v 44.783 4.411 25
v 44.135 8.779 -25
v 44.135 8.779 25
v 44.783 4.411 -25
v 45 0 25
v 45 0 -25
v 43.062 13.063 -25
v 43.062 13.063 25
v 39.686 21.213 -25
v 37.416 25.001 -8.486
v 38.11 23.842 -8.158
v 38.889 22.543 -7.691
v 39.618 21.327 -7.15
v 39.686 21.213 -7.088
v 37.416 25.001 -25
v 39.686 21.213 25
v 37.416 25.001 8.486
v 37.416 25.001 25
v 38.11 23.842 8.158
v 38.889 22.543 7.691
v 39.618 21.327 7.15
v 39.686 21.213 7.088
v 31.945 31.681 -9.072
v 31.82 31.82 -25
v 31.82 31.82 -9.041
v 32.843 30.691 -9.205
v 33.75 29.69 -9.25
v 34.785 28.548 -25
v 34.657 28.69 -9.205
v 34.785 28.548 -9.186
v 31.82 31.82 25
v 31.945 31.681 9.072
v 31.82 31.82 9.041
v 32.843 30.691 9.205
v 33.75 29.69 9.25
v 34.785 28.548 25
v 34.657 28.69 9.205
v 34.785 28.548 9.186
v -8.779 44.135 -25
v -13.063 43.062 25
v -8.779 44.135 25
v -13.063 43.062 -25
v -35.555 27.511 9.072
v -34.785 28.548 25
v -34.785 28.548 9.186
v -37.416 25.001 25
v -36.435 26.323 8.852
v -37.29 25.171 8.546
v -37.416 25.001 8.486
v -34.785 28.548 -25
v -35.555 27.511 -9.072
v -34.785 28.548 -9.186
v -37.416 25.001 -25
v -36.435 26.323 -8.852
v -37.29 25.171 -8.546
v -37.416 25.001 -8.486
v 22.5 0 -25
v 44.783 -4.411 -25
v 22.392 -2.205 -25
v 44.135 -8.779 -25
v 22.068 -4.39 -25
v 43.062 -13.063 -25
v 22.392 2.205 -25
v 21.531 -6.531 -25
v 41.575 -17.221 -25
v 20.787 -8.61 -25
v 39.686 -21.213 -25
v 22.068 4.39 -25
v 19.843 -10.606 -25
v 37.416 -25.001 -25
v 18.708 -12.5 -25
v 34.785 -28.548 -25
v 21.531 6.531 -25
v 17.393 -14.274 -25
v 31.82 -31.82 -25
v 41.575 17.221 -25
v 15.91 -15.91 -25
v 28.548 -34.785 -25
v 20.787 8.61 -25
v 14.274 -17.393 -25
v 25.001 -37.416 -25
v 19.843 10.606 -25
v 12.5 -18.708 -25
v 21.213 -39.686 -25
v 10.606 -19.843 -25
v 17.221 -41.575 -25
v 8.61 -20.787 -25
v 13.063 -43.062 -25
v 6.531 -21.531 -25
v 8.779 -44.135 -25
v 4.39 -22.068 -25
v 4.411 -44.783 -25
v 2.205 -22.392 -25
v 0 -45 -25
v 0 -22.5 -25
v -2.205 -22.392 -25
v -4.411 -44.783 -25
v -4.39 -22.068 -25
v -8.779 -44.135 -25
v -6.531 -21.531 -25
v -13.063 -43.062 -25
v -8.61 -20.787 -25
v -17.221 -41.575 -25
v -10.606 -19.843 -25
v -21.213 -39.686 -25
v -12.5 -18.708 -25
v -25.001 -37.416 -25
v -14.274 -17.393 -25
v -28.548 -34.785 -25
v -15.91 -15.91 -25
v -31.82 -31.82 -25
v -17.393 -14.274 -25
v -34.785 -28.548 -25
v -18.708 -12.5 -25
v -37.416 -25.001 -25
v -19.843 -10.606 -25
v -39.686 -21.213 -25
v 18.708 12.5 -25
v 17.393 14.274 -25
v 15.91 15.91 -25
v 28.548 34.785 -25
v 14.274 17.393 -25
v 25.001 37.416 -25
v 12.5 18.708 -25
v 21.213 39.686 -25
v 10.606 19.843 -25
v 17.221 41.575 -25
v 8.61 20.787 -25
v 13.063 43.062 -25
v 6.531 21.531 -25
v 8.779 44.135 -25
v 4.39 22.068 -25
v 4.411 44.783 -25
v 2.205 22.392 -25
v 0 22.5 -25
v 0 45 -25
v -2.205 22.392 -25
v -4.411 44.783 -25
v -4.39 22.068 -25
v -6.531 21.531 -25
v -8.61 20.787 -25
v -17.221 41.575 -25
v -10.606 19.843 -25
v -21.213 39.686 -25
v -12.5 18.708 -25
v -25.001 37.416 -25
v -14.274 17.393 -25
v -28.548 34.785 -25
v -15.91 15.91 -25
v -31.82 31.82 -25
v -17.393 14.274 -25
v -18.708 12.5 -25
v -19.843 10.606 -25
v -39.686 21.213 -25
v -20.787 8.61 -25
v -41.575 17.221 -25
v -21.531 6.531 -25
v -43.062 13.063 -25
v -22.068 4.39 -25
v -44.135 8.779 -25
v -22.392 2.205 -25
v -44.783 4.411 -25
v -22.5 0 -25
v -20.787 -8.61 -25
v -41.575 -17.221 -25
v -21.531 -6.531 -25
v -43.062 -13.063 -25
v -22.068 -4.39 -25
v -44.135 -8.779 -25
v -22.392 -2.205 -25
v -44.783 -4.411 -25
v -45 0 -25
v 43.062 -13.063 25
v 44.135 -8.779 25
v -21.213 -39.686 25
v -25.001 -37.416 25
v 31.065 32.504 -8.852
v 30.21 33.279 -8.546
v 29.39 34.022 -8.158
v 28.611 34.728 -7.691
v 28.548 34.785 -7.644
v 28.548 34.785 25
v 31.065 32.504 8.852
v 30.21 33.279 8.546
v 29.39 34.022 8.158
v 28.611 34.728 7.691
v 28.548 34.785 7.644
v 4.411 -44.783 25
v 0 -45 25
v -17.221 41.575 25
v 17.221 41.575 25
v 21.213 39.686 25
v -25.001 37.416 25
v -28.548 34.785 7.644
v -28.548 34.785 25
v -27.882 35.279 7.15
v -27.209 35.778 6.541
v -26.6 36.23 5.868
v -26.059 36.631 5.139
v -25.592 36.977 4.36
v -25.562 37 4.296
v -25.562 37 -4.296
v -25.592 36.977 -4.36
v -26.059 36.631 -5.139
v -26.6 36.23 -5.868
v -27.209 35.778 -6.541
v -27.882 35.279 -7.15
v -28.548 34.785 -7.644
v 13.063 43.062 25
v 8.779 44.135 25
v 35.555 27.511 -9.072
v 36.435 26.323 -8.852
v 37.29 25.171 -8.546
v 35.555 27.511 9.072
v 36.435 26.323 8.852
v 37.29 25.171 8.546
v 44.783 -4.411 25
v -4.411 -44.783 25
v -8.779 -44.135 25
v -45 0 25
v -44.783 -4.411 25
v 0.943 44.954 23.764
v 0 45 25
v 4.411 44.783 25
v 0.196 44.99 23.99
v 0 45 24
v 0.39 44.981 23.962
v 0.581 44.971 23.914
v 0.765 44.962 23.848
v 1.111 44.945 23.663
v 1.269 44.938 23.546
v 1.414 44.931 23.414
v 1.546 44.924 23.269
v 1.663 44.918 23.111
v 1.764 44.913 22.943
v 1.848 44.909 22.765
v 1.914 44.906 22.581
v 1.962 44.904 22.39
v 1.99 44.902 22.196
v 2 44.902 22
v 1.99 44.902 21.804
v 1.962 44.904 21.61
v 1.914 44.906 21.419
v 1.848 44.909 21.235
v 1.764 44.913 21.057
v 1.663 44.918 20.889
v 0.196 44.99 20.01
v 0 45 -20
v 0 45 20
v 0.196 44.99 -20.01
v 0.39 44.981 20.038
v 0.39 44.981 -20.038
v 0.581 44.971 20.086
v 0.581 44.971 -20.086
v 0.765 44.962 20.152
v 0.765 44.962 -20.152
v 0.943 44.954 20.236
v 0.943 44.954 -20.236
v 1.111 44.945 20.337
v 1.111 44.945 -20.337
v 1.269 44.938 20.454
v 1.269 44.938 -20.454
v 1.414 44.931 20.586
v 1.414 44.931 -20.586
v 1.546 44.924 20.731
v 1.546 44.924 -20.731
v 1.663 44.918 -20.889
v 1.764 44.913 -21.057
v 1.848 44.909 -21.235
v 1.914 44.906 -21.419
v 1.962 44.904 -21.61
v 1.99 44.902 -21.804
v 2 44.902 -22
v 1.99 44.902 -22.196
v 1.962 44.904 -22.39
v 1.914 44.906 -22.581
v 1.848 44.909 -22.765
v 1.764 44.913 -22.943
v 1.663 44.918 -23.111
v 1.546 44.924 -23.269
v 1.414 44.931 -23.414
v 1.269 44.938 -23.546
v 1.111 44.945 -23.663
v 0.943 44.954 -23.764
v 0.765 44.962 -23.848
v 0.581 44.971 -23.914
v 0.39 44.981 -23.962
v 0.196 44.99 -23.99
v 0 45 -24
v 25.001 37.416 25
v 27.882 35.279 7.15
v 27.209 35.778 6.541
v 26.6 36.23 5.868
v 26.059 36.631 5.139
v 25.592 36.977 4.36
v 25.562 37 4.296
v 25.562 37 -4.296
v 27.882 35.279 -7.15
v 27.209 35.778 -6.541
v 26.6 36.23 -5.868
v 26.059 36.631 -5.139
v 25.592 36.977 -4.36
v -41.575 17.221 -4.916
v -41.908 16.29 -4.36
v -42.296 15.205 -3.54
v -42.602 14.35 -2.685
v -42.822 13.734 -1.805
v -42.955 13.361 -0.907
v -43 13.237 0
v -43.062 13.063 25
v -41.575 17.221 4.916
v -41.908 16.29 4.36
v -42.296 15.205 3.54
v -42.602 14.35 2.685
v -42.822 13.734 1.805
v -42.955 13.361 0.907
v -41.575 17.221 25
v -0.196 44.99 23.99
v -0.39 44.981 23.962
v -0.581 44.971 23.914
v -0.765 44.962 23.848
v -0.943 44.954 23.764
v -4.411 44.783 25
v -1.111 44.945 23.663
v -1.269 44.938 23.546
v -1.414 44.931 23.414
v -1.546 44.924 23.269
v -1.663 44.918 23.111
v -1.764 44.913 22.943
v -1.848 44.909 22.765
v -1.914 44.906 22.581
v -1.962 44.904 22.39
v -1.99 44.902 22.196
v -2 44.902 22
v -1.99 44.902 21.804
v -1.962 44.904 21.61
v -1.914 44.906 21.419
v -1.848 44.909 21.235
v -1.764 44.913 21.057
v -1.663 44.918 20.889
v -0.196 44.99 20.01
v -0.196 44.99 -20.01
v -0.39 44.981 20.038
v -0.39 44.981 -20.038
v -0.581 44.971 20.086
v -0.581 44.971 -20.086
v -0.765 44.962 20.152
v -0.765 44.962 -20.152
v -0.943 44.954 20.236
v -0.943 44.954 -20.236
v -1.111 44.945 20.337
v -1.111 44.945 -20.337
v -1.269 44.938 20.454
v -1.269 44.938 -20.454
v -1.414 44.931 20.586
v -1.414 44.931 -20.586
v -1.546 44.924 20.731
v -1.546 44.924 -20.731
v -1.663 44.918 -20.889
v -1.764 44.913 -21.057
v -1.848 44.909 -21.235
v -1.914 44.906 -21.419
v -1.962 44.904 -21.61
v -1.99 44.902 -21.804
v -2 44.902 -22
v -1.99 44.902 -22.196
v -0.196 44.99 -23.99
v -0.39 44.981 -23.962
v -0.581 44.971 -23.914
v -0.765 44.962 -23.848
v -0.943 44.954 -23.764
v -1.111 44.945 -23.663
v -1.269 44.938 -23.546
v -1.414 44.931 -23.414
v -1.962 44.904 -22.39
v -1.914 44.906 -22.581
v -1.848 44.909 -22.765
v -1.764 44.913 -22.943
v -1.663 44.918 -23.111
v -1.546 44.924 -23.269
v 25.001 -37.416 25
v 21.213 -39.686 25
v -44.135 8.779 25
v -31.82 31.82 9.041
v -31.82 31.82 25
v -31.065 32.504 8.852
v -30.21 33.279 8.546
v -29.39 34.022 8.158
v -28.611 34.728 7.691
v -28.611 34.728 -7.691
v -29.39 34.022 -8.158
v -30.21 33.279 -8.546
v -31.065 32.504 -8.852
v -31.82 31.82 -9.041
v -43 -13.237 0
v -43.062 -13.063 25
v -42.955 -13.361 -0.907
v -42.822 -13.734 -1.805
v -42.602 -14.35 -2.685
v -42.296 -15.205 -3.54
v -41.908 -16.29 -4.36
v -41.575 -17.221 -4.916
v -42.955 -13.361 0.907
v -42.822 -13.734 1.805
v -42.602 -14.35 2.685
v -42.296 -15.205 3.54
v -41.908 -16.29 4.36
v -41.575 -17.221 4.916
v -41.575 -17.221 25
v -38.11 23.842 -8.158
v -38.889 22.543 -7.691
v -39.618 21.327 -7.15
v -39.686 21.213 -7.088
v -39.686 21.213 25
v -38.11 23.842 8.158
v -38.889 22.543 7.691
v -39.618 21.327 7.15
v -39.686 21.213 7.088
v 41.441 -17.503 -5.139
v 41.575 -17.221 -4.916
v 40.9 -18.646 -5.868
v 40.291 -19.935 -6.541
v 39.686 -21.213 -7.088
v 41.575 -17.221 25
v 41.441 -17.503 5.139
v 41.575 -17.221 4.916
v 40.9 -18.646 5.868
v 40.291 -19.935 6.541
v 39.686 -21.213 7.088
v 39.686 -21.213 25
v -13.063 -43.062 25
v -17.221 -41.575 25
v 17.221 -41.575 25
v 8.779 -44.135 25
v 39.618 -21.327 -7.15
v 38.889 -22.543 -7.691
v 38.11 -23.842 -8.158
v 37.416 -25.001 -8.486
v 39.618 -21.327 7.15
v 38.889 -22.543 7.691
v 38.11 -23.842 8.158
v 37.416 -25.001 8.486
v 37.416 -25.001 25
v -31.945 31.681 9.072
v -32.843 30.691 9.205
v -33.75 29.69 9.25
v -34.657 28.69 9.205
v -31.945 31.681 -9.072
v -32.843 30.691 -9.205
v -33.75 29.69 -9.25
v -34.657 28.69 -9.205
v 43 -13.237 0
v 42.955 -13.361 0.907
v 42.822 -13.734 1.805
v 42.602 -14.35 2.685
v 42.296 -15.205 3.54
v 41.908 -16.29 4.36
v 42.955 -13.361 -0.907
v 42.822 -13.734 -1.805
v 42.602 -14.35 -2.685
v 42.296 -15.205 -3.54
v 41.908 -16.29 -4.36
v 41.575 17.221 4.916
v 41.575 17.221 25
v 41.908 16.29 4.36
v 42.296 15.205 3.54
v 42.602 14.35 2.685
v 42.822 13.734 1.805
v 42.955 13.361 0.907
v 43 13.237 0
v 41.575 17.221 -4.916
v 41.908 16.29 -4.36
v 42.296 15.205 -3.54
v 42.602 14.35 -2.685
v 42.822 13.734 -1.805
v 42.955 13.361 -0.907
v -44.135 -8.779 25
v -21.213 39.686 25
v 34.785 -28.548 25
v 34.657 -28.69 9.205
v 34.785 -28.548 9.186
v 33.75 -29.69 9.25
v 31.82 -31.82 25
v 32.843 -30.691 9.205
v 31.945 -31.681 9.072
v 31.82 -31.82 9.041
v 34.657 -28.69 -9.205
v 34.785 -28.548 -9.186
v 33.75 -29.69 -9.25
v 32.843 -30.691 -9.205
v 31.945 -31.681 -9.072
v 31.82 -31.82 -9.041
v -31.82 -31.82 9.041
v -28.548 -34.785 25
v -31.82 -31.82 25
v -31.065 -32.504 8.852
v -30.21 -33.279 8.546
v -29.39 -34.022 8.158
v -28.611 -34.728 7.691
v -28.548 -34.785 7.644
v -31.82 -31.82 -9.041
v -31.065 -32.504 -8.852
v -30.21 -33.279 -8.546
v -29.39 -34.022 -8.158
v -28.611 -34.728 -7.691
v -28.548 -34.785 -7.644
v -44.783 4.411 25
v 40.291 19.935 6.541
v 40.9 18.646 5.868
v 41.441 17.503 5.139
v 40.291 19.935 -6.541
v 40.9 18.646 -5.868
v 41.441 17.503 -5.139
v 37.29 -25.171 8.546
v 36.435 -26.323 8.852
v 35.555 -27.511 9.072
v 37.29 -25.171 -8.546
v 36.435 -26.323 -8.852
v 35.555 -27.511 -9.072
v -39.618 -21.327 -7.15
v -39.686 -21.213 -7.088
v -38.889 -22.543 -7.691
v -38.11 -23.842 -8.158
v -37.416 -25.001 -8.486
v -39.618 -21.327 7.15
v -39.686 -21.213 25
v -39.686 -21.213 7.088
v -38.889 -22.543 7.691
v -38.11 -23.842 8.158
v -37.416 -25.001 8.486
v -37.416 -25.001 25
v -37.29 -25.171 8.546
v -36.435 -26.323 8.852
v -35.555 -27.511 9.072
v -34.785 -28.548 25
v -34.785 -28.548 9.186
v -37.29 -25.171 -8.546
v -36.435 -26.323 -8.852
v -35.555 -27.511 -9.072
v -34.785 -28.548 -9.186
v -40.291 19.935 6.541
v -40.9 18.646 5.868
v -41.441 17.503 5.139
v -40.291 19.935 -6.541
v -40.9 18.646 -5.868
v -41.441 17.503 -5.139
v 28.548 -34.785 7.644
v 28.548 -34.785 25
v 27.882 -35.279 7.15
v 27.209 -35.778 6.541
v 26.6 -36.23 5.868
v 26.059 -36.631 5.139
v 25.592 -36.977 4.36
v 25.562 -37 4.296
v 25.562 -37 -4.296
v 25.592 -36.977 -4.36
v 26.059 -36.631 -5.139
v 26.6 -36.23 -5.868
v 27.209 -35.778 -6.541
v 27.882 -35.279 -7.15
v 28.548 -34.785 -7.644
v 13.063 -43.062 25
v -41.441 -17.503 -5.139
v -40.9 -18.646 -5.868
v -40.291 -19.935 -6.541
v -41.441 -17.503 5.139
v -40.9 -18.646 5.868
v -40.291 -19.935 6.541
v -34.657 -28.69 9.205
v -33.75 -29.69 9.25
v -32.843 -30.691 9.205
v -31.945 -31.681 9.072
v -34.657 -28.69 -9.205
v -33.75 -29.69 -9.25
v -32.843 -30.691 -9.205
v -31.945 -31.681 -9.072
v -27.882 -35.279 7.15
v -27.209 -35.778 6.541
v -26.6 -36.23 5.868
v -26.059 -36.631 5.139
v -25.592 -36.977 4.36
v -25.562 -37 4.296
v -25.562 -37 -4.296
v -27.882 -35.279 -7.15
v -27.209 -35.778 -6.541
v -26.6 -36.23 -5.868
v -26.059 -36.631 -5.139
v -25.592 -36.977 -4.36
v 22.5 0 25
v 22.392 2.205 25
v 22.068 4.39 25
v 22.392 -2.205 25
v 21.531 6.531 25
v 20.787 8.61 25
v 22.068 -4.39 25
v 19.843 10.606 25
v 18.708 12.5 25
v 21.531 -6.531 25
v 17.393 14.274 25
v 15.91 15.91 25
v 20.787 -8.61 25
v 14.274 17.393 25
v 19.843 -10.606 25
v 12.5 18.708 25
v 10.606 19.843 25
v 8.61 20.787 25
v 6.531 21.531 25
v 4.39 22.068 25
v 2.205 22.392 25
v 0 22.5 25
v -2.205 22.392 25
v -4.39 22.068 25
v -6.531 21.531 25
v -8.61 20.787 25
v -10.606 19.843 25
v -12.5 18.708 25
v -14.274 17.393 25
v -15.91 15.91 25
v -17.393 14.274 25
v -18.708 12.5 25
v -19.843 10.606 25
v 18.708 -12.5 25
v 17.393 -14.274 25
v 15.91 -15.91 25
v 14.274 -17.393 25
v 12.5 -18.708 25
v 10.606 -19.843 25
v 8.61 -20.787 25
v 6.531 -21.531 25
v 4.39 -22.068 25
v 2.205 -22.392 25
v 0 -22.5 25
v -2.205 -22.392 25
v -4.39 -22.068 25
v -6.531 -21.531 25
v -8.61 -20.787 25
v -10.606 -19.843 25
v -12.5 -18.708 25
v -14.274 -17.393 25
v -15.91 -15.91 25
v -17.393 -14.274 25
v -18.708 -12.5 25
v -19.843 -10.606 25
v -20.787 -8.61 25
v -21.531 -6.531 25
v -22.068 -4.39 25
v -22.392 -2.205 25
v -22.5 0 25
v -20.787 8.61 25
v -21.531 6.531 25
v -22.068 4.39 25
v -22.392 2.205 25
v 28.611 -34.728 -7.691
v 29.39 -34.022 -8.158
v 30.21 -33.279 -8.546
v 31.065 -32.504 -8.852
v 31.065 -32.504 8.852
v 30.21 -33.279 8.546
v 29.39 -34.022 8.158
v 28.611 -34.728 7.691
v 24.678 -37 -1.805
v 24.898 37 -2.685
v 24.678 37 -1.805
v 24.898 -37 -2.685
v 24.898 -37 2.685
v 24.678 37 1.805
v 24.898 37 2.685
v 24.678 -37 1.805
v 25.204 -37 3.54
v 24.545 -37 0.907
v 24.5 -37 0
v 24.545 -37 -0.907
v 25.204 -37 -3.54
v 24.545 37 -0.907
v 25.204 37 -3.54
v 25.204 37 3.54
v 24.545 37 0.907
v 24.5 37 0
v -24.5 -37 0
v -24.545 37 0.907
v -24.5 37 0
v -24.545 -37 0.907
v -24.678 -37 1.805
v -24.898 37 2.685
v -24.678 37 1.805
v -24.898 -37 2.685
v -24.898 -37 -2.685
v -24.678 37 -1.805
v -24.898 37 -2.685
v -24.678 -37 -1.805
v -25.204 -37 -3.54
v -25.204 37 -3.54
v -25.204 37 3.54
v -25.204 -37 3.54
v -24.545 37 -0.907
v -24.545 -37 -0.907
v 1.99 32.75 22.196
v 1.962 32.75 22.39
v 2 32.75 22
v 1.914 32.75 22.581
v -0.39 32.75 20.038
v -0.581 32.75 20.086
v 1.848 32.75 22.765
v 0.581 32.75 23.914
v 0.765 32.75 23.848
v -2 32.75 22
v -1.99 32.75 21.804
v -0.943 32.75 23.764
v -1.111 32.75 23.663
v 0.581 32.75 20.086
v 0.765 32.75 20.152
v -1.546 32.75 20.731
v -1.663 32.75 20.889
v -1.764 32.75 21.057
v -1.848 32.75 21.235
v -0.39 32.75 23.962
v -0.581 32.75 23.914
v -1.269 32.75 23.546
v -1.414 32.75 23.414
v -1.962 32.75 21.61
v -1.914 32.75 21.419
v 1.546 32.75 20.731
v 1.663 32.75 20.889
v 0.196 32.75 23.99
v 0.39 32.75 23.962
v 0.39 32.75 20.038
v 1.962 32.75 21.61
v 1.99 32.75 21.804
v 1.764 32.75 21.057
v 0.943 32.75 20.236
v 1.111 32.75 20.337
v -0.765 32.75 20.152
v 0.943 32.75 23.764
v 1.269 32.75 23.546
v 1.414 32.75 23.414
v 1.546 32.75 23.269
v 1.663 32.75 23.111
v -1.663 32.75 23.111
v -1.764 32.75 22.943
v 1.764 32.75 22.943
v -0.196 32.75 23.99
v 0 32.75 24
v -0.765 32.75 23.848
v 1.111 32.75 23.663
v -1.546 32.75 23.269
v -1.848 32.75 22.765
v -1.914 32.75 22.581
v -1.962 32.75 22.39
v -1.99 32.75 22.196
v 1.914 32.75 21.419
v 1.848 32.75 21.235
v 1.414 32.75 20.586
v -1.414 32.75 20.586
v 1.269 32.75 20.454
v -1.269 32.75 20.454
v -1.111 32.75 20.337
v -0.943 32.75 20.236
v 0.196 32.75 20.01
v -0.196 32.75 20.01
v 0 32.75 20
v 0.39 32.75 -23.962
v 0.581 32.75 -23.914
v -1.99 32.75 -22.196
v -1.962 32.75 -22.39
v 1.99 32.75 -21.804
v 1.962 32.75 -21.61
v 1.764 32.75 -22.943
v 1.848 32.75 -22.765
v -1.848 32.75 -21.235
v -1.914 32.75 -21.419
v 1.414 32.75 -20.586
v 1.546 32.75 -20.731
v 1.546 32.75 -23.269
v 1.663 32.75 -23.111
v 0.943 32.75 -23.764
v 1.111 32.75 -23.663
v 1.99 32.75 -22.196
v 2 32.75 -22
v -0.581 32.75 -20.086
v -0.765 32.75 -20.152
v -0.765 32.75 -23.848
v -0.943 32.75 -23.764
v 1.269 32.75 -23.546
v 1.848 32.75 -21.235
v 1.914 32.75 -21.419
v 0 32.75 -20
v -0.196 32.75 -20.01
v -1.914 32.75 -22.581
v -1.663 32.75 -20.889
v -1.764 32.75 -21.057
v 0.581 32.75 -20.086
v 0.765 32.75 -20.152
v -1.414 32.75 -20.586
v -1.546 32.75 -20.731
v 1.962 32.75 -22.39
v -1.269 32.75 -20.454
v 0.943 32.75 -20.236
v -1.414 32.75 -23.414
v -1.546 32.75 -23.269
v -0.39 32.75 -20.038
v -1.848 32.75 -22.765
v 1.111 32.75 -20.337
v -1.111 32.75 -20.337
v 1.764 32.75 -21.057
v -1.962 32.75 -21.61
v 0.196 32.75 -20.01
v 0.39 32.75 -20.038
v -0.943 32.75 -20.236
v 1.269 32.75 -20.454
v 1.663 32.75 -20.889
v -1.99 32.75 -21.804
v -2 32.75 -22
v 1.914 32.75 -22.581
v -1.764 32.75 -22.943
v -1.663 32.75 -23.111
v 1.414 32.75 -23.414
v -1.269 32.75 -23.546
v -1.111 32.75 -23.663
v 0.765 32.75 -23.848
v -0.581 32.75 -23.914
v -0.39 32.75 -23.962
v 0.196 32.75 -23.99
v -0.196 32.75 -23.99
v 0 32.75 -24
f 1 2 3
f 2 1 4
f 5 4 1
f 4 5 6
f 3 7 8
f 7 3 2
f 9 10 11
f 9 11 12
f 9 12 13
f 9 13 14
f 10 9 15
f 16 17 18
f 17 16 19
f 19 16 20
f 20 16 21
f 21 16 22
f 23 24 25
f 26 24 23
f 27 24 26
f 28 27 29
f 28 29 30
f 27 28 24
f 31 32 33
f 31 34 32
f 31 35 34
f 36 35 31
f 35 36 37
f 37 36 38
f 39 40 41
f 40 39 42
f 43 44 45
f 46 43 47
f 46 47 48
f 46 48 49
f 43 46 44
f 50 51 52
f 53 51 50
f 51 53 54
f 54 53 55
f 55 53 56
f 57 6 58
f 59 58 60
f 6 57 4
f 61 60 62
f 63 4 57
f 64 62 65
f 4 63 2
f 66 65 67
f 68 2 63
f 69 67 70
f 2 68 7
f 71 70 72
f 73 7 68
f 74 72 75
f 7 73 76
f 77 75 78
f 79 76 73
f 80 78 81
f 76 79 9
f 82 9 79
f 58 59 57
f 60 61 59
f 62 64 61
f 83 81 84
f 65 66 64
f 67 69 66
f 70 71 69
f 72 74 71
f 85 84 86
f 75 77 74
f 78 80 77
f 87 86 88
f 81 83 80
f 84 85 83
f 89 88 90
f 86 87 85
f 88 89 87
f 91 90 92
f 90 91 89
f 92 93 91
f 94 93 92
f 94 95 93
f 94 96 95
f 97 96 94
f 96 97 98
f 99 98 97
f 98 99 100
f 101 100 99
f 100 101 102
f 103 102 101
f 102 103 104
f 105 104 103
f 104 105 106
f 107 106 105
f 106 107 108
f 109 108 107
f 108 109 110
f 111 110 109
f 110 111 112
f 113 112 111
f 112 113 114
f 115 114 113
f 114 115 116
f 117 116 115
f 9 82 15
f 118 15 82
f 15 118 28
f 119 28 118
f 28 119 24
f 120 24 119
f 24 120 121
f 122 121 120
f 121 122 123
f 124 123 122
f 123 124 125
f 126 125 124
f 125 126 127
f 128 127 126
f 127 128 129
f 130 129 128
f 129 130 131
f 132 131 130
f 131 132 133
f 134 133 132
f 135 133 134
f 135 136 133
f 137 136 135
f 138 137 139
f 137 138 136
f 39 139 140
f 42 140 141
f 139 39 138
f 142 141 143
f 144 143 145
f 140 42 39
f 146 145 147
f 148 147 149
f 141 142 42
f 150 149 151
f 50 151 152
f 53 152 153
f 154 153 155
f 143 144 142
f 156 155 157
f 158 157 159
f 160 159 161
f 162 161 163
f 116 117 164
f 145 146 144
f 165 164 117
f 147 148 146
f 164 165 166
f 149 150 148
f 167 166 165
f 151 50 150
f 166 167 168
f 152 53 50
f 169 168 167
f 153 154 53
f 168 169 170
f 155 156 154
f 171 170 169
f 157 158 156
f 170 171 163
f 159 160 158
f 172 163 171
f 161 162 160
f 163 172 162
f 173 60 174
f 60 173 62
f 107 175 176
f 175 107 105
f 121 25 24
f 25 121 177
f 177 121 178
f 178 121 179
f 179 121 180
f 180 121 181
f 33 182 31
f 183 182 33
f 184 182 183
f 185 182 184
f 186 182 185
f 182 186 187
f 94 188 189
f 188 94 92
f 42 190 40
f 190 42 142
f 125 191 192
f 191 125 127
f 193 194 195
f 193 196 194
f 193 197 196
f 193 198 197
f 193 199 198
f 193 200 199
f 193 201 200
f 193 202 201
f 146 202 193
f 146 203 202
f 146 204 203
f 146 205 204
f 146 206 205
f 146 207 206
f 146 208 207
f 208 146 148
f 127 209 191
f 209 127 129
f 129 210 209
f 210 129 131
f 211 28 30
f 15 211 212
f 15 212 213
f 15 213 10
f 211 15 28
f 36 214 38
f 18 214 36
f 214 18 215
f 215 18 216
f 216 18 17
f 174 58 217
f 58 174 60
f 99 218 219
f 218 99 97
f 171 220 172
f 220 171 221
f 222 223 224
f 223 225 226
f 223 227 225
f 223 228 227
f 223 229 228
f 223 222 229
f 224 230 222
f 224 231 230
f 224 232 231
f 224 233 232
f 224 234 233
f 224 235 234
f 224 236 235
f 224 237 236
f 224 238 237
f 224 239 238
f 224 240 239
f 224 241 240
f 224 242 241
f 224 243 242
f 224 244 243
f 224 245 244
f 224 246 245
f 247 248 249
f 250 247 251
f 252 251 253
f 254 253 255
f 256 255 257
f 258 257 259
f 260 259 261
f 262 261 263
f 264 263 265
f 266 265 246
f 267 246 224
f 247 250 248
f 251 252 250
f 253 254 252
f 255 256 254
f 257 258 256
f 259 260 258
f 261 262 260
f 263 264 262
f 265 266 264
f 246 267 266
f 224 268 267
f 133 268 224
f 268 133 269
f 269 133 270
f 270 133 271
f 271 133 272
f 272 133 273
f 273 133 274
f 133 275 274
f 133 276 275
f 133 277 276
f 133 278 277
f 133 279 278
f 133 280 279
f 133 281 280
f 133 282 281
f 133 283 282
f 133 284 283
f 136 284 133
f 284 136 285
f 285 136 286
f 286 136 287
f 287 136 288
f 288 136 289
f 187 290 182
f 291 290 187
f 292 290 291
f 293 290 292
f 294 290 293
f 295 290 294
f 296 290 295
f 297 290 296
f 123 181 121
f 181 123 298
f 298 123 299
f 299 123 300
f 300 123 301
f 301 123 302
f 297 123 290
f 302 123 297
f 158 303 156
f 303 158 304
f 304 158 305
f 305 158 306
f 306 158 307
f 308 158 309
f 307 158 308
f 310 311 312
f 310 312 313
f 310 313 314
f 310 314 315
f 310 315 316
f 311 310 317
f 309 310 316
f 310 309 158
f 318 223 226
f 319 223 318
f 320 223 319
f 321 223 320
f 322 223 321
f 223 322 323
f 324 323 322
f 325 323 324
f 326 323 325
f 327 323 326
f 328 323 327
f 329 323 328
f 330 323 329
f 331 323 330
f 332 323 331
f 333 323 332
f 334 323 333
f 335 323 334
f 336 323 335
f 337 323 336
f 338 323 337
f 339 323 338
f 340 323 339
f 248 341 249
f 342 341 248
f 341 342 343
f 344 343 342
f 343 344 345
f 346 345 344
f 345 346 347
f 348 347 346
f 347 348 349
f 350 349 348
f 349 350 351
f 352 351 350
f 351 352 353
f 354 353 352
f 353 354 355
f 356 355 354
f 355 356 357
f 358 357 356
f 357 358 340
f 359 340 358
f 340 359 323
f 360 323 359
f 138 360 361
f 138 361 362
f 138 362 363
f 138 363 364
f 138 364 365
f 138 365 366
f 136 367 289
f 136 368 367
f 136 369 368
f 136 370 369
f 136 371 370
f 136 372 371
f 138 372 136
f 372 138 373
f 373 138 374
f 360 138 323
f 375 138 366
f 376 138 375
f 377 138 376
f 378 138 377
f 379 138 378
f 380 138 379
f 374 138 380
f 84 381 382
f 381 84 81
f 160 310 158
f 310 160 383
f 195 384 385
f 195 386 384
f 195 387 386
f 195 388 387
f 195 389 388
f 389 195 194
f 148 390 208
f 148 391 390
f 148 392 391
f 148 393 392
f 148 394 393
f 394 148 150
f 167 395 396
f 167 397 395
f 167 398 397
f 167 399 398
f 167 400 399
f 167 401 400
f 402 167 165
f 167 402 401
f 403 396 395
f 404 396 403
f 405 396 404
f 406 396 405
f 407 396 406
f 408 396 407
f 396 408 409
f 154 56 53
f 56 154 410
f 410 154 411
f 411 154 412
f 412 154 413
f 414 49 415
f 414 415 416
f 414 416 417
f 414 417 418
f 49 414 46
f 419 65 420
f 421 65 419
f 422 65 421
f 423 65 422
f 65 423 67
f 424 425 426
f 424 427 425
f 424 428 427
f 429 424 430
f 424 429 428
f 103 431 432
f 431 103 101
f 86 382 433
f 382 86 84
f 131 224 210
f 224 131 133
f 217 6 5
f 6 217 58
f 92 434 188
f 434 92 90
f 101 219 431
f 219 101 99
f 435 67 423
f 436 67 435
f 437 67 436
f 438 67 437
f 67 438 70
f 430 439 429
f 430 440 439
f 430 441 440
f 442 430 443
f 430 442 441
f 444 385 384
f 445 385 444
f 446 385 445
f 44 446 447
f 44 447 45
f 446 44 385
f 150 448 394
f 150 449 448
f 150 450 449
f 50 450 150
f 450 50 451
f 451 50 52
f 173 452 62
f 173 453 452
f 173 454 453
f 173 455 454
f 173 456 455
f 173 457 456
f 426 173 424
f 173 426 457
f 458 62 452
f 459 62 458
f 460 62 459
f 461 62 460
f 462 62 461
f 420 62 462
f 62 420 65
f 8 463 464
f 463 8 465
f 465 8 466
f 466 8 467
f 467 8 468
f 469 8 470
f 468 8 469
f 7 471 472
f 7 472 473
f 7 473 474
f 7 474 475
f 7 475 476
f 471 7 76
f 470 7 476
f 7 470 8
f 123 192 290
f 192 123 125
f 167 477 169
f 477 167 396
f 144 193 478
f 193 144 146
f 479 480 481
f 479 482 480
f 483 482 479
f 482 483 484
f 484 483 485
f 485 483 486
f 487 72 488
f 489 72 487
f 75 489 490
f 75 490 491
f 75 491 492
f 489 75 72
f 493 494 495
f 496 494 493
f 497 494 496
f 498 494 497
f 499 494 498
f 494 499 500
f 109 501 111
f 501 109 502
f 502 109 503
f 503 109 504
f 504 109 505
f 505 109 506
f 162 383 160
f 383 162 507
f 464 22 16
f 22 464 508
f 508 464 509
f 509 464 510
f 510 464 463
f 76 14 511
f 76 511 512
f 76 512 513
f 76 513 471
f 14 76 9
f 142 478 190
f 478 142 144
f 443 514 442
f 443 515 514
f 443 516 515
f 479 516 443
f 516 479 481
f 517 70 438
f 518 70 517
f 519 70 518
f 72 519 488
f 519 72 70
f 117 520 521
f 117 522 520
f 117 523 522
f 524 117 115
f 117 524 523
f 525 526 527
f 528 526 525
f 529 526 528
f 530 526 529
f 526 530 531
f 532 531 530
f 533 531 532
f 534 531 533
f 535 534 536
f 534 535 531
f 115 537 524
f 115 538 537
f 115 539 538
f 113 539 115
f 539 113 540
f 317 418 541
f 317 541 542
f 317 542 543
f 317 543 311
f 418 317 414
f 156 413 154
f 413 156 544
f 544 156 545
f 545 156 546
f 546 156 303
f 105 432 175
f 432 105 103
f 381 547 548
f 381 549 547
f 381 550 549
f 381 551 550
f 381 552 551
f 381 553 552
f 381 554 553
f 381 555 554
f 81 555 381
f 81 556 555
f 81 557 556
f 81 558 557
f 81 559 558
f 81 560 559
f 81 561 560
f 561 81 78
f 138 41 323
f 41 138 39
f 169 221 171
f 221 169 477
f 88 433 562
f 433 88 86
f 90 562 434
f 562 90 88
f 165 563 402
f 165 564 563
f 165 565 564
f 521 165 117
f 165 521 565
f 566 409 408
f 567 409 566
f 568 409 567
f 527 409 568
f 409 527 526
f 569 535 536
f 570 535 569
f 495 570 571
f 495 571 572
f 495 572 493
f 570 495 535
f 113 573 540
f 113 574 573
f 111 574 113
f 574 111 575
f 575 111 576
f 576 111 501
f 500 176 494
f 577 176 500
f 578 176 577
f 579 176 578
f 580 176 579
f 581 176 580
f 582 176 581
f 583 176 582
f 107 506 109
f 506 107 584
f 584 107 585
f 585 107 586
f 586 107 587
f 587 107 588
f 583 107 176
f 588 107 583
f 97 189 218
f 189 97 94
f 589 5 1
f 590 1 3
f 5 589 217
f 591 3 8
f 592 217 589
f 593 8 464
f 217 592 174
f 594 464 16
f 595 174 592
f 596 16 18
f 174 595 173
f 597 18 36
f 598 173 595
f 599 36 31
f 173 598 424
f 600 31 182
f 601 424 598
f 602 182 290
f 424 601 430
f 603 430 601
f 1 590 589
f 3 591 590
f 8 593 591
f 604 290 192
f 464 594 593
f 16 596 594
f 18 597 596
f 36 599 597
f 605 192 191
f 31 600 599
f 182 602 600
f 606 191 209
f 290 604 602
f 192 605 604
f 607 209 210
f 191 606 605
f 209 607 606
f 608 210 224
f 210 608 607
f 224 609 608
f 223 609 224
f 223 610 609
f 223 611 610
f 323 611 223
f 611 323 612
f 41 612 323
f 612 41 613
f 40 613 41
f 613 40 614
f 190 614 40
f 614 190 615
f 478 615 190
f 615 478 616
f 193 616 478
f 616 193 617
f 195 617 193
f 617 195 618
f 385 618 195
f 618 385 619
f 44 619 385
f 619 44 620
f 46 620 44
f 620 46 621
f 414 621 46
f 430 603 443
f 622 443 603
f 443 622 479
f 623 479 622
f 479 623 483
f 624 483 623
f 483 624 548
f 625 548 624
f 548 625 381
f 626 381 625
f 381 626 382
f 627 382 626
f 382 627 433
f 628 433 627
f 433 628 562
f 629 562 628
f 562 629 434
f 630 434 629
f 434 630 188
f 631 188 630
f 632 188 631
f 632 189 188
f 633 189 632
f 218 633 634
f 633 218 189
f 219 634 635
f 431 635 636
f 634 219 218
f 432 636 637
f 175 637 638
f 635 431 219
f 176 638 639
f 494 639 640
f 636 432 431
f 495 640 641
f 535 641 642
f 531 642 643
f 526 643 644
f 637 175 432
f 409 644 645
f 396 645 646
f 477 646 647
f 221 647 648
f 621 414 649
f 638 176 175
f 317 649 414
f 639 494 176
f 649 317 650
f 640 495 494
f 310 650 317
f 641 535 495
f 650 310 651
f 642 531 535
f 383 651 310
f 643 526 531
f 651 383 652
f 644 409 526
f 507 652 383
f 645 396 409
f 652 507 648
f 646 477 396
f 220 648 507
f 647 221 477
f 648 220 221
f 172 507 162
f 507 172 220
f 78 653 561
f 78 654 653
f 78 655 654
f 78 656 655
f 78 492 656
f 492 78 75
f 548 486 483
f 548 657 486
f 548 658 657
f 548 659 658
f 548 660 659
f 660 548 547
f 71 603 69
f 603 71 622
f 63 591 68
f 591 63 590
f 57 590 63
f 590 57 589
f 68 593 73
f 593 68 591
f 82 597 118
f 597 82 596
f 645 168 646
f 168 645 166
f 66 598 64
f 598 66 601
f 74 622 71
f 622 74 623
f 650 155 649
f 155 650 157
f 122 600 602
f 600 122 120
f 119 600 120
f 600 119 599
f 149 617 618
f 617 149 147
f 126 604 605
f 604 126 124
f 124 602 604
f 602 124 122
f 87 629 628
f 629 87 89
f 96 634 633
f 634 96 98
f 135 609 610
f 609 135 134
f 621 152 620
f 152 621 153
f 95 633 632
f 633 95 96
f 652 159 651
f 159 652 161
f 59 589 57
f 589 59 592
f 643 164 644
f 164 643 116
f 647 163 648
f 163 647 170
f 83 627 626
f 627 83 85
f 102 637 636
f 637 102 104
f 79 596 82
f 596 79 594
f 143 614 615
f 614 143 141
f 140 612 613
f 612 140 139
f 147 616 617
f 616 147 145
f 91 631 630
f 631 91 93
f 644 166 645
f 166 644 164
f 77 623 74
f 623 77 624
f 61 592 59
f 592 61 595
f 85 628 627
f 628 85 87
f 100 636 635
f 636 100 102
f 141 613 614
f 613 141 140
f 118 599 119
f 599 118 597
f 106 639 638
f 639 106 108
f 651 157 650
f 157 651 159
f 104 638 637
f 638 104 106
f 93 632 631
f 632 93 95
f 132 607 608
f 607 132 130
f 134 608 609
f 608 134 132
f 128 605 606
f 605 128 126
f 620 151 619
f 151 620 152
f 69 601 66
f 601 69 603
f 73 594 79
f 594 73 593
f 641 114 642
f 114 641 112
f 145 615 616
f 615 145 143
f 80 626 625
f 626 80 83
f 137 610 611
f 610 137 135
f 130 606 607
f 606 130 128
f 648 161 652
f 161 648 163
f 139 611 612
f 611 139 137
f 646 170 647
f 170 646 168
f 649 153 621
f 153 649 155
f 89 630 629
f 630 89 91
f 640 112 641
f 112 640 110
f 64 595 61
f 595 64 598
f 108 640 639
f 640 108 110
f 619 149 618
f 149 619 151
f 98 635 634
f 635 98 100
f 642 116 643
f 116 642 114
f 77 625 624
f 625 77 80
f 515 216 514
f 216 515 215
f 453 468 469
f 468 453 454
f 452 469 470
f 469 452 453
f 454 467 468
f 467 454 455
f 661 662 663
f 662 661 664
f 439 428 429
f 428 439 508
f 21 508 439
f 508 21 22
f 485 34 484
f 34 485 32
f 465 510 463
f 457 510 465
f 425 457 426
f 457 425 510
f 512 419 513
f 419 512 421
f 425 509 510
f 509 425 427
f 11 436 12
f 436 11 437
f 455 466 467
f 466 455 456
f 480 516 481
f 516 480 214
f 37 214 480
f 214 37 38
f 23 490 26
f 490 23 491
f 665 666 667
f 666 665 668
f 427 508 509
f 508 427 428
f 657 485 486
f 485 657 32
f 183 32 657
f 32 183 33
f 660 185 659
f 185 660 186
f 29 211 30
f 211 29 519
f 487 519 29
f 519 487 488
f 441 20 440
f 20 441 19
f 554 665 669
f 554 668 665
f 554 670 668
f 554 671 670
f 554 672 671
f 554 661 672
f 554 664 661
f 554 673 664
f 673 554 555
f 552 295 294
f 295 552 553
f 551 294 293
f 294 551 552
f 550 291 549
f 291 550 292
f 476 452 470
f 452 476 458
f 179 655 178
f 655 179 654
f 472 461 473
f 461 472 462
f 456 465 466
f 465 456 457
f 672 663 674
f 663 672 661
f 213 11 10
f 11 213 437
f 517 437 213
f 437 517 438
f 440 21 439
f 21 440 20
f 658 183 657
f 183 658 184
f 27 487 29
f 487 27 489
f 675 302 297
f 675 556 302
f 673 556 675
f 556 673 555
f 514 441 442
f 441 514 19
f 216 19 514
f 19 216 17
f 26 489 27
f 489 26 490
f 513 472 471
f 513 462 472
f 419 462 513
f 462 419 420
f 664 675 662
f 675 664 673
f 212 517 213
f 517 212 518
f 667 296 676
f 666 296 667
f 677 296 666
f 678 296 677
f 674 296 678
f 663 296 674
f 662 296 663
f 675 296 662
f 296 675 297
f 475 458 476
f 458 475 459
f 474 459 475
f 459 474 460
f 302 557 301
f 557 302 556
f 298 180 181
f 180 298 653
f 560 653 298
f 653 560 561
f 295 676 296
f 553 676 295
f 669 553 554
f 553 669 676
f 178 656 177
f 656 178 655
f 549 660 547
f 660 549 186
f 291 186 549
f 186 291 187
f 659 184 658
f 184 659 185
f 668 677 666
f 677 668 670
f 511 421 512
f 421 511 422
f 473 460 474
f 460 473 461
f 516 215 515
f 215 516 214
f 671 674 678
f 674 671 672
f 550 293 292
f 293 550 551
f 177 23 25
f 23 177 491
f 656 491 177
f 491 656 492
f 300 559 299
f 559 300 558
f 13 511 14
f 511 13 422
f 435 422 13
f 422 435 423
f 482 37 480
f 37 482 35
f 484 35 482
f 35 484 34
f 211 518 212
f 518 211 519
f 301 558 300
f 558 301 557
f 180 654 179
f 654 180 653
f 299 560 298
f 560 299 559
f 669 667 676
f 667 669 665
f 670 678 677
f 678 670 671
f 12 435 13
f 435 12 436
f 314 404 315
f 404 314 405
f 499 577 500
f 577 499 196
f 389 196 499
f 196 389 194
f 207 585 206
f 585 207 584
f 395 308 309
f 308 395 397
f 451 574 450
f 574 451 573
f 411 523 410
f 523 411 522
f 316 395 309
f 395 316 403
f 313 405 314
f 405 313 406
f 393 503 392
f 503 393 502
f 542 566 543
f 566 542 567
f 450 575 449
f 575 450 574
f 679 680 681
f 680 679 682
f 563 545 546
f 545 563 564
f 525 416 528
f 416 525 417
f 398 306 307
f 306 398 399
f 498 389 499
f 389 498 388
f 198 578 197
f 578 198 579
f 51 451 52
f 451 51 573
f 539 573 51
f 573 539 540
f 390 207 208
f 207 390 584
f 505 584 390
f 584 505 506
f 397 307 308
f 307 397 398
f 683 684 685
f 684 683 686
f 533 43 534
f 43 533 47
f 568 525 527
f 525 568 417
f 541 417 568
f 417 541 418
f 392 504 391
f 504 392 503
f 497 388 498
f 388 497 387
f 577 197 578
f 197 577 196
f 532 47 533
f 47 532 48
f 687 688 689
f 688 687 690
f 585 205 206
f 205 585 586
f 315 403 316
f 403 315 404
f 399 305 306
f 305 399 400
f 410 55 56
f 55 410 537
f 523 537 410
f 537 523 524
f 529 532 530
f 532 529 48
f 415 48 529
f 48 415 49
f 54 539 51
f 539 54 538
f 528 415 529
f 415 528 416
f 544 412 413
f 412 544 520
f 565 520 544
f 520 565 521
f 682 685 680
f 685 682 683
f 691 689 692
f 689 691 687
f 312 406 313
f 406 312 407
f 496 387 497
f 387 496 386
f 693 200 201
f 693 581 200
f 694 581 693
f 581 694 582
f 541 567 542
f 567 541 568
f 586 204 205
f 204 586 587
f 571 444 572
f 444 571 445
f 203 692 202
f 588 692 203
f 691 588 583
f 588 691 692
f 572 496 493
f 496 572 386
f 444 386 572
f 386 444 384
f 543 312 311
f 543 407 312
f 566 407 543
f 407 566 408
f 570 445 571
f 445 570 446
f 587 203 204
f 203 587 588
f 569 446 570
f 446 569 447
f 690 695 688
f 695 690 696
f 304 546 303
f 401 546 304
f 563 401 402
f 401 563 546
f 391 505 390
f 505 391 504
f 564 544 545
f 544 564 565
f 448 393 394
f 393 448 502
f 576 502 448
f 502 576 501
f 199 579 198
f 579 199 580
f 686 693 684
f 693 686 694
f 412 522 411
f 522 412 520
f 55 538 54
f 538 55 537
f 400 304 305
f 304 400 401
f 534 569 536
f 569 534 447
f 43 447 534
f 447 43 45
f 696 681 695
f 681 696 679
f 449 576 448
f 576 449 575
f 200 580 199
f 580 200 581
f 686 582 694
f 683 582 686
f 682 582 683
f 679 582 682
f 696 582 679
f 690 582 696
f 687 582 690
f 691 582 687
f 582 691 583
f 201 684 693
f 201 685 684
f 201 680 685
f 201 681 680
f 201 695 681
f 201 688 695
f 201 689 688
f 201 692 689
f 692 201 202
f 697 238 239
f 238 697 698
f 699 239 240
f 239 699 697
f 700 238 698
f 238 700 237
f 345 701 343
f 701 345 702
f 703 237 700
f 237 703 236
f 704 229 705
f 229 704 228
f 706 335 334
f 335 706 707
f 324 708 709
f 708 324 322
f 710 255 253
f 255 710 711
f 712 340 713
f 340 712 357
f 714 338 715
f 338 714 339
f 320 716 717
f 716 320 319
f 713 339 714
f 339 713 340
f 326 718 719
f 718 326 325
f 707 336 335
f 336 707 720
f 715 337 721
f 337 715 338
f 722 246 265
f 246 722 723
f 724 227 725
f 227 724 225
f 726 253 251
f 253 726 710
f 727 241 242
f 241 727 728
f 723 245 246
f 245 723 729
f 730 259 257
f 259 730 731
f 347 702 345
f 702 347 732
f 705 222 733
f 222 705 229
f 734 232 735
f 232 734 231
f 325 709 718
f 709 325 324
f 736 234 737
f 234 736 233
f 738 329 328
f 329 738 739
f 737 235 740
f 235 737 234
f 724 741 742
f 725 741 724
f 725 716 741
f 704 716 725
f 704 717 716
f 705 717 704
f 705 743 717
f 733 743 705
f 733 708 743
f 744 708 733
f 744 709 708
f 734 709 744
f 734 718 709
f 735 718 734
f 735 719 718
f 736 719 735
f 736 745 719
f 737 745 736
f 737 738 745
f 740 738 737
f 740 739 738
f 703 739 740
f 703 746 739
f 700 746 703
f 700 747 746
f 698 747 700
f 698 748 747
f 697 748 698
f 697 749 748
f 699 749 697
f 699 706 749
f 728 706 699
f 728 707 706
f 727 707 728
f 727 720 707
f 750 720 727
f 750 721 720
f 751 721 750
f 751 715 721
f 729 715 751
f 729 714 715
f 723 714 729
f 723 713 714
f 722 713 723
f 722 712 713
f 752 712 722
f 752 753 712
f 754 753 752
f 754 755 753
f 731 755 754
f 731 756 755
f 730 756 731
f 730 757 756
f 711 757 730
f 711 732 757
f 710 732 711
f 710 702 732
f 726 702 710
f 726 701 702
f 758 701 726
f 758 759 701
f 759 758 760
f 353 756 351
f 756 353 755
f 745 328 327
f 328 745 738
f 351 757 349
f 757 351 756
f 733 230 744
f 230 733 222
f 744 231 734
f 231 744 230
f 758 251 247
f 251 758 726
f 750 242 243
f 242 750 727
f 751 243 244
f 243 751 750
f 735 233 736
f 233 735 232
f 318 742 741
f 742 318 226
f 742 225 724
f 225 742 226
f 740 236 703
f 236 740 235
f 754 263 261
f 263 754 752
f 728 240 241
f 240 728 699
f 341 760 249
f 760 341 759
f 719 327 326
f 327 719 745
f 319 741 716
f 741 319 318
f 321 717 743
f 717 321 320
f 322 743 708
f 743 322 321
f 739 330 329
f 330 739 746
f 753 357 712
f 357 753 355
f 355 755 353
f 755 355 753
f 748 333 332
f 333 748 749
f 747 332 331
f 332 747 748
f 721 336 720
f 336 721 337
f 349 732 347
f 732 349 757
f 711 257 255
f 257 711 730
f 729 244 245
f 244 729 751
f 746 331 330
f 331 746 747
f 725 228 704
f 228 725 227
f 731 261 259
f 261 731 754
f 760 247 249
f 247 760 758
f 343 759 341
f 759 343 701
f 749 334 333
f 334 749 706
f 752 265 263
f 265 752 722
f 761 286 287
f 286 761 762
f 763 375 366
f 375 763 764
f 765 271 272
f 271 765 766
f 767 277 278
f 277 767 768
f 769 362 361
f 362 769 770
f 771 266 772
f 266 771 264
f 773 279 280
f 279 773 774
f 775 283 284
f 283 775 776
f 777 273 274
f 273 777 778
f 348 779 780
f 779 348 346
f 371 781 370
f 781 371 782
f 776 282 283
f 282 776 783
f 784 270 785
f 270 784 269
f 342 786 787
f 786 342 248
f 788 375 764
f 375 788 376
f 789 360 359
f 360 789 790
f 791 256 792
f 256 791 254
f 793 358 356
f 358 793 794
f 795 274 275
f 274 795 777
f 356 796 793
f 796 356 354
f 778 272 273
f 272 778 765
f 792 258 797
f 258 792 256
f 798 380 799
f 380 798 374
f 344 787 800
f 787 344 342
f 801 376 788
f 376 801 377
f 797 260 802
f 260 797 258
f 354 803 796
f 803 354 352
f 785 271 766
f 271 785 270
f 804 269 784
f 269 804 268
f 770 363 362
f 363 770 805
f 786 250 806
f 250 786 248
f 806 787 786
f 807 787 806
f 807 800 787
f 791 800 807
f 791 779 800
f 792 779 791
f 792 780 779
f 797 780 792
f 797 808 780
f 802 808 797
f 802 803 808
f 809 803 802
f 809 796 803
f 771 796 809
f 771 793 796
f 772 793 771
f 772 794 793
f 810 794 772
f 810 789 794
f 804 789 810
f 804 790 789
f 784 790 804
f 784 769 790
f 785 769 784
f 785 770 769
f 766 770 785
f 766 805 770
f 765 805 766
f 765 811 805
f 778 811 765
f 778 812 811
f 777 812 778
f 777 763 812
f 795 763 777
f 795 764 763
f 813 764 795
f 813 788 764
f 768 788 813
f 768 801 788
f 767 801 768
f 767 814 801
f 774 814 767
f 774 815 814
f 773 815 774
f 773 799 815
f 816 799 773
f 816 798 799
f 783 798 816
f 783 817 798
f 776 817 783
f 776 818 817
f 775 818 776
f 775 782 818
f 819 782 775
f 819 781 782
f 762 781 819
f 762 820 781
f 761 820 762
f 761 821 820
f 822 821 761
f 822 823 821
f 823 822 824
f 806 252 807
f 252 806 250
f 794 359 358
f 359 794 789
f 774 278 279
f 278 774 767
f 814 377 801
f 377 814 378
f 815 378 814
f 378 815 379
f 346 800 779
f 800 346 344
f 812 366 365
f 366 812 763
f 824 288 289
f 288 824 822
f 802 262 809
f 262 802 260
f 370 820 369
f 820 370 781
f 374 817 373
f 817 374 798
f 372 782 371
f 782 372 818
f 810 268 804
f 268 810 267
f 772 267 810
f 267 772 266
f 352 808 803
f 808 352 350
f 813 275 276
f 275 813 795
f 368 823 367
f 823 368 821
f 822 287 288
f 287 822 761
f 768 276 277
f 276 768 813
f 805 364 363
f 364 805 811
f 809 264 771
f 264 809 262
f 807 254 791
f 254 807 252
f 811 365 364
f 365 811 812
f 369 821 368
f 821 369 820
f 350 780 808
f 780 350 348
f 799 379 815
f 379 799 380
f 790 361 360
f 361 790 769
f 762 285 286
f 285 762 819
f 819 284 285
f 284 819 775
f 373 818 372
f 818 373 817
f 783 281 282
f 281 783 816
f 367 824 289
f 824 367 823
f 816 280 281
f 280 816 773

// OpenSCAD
// COBRA Vertebra - L3 V21
// Height: 50.0mm, OD: 90.0mm

$fn = 64;

difference() {
    // Outer cylinder
    cylinder(h=50.0, d=90.0, center=true);
    
    // Inner channel
    cylinder(h=52.0, d=45.0, center=true);

    // Battery cavity 1
    rotate([0, 0, 0])
    translate([33.75, 0, 0])
    rotate([90, 0, 0])
    cylinder(h=74.0, d=18.5, center=true);

    // Battery cavity 2
    rotate([0, 0, 180])
    translate([33.75, 0, 0])
    rotate([90, 0, 0])
    cylinder(h=74.0, d=18.5, center=true);

    // Pivot holes
    translate([0, 45.0, 22.0])
    rotate([90, 0, 0])
    cylinder(h=24.5, d=4, center=true);
    
    translate([0, 45.0, -22.0])
    rotate([90, 0, 0])
    cylinder(h=24.5, d=4, center=true);
}
